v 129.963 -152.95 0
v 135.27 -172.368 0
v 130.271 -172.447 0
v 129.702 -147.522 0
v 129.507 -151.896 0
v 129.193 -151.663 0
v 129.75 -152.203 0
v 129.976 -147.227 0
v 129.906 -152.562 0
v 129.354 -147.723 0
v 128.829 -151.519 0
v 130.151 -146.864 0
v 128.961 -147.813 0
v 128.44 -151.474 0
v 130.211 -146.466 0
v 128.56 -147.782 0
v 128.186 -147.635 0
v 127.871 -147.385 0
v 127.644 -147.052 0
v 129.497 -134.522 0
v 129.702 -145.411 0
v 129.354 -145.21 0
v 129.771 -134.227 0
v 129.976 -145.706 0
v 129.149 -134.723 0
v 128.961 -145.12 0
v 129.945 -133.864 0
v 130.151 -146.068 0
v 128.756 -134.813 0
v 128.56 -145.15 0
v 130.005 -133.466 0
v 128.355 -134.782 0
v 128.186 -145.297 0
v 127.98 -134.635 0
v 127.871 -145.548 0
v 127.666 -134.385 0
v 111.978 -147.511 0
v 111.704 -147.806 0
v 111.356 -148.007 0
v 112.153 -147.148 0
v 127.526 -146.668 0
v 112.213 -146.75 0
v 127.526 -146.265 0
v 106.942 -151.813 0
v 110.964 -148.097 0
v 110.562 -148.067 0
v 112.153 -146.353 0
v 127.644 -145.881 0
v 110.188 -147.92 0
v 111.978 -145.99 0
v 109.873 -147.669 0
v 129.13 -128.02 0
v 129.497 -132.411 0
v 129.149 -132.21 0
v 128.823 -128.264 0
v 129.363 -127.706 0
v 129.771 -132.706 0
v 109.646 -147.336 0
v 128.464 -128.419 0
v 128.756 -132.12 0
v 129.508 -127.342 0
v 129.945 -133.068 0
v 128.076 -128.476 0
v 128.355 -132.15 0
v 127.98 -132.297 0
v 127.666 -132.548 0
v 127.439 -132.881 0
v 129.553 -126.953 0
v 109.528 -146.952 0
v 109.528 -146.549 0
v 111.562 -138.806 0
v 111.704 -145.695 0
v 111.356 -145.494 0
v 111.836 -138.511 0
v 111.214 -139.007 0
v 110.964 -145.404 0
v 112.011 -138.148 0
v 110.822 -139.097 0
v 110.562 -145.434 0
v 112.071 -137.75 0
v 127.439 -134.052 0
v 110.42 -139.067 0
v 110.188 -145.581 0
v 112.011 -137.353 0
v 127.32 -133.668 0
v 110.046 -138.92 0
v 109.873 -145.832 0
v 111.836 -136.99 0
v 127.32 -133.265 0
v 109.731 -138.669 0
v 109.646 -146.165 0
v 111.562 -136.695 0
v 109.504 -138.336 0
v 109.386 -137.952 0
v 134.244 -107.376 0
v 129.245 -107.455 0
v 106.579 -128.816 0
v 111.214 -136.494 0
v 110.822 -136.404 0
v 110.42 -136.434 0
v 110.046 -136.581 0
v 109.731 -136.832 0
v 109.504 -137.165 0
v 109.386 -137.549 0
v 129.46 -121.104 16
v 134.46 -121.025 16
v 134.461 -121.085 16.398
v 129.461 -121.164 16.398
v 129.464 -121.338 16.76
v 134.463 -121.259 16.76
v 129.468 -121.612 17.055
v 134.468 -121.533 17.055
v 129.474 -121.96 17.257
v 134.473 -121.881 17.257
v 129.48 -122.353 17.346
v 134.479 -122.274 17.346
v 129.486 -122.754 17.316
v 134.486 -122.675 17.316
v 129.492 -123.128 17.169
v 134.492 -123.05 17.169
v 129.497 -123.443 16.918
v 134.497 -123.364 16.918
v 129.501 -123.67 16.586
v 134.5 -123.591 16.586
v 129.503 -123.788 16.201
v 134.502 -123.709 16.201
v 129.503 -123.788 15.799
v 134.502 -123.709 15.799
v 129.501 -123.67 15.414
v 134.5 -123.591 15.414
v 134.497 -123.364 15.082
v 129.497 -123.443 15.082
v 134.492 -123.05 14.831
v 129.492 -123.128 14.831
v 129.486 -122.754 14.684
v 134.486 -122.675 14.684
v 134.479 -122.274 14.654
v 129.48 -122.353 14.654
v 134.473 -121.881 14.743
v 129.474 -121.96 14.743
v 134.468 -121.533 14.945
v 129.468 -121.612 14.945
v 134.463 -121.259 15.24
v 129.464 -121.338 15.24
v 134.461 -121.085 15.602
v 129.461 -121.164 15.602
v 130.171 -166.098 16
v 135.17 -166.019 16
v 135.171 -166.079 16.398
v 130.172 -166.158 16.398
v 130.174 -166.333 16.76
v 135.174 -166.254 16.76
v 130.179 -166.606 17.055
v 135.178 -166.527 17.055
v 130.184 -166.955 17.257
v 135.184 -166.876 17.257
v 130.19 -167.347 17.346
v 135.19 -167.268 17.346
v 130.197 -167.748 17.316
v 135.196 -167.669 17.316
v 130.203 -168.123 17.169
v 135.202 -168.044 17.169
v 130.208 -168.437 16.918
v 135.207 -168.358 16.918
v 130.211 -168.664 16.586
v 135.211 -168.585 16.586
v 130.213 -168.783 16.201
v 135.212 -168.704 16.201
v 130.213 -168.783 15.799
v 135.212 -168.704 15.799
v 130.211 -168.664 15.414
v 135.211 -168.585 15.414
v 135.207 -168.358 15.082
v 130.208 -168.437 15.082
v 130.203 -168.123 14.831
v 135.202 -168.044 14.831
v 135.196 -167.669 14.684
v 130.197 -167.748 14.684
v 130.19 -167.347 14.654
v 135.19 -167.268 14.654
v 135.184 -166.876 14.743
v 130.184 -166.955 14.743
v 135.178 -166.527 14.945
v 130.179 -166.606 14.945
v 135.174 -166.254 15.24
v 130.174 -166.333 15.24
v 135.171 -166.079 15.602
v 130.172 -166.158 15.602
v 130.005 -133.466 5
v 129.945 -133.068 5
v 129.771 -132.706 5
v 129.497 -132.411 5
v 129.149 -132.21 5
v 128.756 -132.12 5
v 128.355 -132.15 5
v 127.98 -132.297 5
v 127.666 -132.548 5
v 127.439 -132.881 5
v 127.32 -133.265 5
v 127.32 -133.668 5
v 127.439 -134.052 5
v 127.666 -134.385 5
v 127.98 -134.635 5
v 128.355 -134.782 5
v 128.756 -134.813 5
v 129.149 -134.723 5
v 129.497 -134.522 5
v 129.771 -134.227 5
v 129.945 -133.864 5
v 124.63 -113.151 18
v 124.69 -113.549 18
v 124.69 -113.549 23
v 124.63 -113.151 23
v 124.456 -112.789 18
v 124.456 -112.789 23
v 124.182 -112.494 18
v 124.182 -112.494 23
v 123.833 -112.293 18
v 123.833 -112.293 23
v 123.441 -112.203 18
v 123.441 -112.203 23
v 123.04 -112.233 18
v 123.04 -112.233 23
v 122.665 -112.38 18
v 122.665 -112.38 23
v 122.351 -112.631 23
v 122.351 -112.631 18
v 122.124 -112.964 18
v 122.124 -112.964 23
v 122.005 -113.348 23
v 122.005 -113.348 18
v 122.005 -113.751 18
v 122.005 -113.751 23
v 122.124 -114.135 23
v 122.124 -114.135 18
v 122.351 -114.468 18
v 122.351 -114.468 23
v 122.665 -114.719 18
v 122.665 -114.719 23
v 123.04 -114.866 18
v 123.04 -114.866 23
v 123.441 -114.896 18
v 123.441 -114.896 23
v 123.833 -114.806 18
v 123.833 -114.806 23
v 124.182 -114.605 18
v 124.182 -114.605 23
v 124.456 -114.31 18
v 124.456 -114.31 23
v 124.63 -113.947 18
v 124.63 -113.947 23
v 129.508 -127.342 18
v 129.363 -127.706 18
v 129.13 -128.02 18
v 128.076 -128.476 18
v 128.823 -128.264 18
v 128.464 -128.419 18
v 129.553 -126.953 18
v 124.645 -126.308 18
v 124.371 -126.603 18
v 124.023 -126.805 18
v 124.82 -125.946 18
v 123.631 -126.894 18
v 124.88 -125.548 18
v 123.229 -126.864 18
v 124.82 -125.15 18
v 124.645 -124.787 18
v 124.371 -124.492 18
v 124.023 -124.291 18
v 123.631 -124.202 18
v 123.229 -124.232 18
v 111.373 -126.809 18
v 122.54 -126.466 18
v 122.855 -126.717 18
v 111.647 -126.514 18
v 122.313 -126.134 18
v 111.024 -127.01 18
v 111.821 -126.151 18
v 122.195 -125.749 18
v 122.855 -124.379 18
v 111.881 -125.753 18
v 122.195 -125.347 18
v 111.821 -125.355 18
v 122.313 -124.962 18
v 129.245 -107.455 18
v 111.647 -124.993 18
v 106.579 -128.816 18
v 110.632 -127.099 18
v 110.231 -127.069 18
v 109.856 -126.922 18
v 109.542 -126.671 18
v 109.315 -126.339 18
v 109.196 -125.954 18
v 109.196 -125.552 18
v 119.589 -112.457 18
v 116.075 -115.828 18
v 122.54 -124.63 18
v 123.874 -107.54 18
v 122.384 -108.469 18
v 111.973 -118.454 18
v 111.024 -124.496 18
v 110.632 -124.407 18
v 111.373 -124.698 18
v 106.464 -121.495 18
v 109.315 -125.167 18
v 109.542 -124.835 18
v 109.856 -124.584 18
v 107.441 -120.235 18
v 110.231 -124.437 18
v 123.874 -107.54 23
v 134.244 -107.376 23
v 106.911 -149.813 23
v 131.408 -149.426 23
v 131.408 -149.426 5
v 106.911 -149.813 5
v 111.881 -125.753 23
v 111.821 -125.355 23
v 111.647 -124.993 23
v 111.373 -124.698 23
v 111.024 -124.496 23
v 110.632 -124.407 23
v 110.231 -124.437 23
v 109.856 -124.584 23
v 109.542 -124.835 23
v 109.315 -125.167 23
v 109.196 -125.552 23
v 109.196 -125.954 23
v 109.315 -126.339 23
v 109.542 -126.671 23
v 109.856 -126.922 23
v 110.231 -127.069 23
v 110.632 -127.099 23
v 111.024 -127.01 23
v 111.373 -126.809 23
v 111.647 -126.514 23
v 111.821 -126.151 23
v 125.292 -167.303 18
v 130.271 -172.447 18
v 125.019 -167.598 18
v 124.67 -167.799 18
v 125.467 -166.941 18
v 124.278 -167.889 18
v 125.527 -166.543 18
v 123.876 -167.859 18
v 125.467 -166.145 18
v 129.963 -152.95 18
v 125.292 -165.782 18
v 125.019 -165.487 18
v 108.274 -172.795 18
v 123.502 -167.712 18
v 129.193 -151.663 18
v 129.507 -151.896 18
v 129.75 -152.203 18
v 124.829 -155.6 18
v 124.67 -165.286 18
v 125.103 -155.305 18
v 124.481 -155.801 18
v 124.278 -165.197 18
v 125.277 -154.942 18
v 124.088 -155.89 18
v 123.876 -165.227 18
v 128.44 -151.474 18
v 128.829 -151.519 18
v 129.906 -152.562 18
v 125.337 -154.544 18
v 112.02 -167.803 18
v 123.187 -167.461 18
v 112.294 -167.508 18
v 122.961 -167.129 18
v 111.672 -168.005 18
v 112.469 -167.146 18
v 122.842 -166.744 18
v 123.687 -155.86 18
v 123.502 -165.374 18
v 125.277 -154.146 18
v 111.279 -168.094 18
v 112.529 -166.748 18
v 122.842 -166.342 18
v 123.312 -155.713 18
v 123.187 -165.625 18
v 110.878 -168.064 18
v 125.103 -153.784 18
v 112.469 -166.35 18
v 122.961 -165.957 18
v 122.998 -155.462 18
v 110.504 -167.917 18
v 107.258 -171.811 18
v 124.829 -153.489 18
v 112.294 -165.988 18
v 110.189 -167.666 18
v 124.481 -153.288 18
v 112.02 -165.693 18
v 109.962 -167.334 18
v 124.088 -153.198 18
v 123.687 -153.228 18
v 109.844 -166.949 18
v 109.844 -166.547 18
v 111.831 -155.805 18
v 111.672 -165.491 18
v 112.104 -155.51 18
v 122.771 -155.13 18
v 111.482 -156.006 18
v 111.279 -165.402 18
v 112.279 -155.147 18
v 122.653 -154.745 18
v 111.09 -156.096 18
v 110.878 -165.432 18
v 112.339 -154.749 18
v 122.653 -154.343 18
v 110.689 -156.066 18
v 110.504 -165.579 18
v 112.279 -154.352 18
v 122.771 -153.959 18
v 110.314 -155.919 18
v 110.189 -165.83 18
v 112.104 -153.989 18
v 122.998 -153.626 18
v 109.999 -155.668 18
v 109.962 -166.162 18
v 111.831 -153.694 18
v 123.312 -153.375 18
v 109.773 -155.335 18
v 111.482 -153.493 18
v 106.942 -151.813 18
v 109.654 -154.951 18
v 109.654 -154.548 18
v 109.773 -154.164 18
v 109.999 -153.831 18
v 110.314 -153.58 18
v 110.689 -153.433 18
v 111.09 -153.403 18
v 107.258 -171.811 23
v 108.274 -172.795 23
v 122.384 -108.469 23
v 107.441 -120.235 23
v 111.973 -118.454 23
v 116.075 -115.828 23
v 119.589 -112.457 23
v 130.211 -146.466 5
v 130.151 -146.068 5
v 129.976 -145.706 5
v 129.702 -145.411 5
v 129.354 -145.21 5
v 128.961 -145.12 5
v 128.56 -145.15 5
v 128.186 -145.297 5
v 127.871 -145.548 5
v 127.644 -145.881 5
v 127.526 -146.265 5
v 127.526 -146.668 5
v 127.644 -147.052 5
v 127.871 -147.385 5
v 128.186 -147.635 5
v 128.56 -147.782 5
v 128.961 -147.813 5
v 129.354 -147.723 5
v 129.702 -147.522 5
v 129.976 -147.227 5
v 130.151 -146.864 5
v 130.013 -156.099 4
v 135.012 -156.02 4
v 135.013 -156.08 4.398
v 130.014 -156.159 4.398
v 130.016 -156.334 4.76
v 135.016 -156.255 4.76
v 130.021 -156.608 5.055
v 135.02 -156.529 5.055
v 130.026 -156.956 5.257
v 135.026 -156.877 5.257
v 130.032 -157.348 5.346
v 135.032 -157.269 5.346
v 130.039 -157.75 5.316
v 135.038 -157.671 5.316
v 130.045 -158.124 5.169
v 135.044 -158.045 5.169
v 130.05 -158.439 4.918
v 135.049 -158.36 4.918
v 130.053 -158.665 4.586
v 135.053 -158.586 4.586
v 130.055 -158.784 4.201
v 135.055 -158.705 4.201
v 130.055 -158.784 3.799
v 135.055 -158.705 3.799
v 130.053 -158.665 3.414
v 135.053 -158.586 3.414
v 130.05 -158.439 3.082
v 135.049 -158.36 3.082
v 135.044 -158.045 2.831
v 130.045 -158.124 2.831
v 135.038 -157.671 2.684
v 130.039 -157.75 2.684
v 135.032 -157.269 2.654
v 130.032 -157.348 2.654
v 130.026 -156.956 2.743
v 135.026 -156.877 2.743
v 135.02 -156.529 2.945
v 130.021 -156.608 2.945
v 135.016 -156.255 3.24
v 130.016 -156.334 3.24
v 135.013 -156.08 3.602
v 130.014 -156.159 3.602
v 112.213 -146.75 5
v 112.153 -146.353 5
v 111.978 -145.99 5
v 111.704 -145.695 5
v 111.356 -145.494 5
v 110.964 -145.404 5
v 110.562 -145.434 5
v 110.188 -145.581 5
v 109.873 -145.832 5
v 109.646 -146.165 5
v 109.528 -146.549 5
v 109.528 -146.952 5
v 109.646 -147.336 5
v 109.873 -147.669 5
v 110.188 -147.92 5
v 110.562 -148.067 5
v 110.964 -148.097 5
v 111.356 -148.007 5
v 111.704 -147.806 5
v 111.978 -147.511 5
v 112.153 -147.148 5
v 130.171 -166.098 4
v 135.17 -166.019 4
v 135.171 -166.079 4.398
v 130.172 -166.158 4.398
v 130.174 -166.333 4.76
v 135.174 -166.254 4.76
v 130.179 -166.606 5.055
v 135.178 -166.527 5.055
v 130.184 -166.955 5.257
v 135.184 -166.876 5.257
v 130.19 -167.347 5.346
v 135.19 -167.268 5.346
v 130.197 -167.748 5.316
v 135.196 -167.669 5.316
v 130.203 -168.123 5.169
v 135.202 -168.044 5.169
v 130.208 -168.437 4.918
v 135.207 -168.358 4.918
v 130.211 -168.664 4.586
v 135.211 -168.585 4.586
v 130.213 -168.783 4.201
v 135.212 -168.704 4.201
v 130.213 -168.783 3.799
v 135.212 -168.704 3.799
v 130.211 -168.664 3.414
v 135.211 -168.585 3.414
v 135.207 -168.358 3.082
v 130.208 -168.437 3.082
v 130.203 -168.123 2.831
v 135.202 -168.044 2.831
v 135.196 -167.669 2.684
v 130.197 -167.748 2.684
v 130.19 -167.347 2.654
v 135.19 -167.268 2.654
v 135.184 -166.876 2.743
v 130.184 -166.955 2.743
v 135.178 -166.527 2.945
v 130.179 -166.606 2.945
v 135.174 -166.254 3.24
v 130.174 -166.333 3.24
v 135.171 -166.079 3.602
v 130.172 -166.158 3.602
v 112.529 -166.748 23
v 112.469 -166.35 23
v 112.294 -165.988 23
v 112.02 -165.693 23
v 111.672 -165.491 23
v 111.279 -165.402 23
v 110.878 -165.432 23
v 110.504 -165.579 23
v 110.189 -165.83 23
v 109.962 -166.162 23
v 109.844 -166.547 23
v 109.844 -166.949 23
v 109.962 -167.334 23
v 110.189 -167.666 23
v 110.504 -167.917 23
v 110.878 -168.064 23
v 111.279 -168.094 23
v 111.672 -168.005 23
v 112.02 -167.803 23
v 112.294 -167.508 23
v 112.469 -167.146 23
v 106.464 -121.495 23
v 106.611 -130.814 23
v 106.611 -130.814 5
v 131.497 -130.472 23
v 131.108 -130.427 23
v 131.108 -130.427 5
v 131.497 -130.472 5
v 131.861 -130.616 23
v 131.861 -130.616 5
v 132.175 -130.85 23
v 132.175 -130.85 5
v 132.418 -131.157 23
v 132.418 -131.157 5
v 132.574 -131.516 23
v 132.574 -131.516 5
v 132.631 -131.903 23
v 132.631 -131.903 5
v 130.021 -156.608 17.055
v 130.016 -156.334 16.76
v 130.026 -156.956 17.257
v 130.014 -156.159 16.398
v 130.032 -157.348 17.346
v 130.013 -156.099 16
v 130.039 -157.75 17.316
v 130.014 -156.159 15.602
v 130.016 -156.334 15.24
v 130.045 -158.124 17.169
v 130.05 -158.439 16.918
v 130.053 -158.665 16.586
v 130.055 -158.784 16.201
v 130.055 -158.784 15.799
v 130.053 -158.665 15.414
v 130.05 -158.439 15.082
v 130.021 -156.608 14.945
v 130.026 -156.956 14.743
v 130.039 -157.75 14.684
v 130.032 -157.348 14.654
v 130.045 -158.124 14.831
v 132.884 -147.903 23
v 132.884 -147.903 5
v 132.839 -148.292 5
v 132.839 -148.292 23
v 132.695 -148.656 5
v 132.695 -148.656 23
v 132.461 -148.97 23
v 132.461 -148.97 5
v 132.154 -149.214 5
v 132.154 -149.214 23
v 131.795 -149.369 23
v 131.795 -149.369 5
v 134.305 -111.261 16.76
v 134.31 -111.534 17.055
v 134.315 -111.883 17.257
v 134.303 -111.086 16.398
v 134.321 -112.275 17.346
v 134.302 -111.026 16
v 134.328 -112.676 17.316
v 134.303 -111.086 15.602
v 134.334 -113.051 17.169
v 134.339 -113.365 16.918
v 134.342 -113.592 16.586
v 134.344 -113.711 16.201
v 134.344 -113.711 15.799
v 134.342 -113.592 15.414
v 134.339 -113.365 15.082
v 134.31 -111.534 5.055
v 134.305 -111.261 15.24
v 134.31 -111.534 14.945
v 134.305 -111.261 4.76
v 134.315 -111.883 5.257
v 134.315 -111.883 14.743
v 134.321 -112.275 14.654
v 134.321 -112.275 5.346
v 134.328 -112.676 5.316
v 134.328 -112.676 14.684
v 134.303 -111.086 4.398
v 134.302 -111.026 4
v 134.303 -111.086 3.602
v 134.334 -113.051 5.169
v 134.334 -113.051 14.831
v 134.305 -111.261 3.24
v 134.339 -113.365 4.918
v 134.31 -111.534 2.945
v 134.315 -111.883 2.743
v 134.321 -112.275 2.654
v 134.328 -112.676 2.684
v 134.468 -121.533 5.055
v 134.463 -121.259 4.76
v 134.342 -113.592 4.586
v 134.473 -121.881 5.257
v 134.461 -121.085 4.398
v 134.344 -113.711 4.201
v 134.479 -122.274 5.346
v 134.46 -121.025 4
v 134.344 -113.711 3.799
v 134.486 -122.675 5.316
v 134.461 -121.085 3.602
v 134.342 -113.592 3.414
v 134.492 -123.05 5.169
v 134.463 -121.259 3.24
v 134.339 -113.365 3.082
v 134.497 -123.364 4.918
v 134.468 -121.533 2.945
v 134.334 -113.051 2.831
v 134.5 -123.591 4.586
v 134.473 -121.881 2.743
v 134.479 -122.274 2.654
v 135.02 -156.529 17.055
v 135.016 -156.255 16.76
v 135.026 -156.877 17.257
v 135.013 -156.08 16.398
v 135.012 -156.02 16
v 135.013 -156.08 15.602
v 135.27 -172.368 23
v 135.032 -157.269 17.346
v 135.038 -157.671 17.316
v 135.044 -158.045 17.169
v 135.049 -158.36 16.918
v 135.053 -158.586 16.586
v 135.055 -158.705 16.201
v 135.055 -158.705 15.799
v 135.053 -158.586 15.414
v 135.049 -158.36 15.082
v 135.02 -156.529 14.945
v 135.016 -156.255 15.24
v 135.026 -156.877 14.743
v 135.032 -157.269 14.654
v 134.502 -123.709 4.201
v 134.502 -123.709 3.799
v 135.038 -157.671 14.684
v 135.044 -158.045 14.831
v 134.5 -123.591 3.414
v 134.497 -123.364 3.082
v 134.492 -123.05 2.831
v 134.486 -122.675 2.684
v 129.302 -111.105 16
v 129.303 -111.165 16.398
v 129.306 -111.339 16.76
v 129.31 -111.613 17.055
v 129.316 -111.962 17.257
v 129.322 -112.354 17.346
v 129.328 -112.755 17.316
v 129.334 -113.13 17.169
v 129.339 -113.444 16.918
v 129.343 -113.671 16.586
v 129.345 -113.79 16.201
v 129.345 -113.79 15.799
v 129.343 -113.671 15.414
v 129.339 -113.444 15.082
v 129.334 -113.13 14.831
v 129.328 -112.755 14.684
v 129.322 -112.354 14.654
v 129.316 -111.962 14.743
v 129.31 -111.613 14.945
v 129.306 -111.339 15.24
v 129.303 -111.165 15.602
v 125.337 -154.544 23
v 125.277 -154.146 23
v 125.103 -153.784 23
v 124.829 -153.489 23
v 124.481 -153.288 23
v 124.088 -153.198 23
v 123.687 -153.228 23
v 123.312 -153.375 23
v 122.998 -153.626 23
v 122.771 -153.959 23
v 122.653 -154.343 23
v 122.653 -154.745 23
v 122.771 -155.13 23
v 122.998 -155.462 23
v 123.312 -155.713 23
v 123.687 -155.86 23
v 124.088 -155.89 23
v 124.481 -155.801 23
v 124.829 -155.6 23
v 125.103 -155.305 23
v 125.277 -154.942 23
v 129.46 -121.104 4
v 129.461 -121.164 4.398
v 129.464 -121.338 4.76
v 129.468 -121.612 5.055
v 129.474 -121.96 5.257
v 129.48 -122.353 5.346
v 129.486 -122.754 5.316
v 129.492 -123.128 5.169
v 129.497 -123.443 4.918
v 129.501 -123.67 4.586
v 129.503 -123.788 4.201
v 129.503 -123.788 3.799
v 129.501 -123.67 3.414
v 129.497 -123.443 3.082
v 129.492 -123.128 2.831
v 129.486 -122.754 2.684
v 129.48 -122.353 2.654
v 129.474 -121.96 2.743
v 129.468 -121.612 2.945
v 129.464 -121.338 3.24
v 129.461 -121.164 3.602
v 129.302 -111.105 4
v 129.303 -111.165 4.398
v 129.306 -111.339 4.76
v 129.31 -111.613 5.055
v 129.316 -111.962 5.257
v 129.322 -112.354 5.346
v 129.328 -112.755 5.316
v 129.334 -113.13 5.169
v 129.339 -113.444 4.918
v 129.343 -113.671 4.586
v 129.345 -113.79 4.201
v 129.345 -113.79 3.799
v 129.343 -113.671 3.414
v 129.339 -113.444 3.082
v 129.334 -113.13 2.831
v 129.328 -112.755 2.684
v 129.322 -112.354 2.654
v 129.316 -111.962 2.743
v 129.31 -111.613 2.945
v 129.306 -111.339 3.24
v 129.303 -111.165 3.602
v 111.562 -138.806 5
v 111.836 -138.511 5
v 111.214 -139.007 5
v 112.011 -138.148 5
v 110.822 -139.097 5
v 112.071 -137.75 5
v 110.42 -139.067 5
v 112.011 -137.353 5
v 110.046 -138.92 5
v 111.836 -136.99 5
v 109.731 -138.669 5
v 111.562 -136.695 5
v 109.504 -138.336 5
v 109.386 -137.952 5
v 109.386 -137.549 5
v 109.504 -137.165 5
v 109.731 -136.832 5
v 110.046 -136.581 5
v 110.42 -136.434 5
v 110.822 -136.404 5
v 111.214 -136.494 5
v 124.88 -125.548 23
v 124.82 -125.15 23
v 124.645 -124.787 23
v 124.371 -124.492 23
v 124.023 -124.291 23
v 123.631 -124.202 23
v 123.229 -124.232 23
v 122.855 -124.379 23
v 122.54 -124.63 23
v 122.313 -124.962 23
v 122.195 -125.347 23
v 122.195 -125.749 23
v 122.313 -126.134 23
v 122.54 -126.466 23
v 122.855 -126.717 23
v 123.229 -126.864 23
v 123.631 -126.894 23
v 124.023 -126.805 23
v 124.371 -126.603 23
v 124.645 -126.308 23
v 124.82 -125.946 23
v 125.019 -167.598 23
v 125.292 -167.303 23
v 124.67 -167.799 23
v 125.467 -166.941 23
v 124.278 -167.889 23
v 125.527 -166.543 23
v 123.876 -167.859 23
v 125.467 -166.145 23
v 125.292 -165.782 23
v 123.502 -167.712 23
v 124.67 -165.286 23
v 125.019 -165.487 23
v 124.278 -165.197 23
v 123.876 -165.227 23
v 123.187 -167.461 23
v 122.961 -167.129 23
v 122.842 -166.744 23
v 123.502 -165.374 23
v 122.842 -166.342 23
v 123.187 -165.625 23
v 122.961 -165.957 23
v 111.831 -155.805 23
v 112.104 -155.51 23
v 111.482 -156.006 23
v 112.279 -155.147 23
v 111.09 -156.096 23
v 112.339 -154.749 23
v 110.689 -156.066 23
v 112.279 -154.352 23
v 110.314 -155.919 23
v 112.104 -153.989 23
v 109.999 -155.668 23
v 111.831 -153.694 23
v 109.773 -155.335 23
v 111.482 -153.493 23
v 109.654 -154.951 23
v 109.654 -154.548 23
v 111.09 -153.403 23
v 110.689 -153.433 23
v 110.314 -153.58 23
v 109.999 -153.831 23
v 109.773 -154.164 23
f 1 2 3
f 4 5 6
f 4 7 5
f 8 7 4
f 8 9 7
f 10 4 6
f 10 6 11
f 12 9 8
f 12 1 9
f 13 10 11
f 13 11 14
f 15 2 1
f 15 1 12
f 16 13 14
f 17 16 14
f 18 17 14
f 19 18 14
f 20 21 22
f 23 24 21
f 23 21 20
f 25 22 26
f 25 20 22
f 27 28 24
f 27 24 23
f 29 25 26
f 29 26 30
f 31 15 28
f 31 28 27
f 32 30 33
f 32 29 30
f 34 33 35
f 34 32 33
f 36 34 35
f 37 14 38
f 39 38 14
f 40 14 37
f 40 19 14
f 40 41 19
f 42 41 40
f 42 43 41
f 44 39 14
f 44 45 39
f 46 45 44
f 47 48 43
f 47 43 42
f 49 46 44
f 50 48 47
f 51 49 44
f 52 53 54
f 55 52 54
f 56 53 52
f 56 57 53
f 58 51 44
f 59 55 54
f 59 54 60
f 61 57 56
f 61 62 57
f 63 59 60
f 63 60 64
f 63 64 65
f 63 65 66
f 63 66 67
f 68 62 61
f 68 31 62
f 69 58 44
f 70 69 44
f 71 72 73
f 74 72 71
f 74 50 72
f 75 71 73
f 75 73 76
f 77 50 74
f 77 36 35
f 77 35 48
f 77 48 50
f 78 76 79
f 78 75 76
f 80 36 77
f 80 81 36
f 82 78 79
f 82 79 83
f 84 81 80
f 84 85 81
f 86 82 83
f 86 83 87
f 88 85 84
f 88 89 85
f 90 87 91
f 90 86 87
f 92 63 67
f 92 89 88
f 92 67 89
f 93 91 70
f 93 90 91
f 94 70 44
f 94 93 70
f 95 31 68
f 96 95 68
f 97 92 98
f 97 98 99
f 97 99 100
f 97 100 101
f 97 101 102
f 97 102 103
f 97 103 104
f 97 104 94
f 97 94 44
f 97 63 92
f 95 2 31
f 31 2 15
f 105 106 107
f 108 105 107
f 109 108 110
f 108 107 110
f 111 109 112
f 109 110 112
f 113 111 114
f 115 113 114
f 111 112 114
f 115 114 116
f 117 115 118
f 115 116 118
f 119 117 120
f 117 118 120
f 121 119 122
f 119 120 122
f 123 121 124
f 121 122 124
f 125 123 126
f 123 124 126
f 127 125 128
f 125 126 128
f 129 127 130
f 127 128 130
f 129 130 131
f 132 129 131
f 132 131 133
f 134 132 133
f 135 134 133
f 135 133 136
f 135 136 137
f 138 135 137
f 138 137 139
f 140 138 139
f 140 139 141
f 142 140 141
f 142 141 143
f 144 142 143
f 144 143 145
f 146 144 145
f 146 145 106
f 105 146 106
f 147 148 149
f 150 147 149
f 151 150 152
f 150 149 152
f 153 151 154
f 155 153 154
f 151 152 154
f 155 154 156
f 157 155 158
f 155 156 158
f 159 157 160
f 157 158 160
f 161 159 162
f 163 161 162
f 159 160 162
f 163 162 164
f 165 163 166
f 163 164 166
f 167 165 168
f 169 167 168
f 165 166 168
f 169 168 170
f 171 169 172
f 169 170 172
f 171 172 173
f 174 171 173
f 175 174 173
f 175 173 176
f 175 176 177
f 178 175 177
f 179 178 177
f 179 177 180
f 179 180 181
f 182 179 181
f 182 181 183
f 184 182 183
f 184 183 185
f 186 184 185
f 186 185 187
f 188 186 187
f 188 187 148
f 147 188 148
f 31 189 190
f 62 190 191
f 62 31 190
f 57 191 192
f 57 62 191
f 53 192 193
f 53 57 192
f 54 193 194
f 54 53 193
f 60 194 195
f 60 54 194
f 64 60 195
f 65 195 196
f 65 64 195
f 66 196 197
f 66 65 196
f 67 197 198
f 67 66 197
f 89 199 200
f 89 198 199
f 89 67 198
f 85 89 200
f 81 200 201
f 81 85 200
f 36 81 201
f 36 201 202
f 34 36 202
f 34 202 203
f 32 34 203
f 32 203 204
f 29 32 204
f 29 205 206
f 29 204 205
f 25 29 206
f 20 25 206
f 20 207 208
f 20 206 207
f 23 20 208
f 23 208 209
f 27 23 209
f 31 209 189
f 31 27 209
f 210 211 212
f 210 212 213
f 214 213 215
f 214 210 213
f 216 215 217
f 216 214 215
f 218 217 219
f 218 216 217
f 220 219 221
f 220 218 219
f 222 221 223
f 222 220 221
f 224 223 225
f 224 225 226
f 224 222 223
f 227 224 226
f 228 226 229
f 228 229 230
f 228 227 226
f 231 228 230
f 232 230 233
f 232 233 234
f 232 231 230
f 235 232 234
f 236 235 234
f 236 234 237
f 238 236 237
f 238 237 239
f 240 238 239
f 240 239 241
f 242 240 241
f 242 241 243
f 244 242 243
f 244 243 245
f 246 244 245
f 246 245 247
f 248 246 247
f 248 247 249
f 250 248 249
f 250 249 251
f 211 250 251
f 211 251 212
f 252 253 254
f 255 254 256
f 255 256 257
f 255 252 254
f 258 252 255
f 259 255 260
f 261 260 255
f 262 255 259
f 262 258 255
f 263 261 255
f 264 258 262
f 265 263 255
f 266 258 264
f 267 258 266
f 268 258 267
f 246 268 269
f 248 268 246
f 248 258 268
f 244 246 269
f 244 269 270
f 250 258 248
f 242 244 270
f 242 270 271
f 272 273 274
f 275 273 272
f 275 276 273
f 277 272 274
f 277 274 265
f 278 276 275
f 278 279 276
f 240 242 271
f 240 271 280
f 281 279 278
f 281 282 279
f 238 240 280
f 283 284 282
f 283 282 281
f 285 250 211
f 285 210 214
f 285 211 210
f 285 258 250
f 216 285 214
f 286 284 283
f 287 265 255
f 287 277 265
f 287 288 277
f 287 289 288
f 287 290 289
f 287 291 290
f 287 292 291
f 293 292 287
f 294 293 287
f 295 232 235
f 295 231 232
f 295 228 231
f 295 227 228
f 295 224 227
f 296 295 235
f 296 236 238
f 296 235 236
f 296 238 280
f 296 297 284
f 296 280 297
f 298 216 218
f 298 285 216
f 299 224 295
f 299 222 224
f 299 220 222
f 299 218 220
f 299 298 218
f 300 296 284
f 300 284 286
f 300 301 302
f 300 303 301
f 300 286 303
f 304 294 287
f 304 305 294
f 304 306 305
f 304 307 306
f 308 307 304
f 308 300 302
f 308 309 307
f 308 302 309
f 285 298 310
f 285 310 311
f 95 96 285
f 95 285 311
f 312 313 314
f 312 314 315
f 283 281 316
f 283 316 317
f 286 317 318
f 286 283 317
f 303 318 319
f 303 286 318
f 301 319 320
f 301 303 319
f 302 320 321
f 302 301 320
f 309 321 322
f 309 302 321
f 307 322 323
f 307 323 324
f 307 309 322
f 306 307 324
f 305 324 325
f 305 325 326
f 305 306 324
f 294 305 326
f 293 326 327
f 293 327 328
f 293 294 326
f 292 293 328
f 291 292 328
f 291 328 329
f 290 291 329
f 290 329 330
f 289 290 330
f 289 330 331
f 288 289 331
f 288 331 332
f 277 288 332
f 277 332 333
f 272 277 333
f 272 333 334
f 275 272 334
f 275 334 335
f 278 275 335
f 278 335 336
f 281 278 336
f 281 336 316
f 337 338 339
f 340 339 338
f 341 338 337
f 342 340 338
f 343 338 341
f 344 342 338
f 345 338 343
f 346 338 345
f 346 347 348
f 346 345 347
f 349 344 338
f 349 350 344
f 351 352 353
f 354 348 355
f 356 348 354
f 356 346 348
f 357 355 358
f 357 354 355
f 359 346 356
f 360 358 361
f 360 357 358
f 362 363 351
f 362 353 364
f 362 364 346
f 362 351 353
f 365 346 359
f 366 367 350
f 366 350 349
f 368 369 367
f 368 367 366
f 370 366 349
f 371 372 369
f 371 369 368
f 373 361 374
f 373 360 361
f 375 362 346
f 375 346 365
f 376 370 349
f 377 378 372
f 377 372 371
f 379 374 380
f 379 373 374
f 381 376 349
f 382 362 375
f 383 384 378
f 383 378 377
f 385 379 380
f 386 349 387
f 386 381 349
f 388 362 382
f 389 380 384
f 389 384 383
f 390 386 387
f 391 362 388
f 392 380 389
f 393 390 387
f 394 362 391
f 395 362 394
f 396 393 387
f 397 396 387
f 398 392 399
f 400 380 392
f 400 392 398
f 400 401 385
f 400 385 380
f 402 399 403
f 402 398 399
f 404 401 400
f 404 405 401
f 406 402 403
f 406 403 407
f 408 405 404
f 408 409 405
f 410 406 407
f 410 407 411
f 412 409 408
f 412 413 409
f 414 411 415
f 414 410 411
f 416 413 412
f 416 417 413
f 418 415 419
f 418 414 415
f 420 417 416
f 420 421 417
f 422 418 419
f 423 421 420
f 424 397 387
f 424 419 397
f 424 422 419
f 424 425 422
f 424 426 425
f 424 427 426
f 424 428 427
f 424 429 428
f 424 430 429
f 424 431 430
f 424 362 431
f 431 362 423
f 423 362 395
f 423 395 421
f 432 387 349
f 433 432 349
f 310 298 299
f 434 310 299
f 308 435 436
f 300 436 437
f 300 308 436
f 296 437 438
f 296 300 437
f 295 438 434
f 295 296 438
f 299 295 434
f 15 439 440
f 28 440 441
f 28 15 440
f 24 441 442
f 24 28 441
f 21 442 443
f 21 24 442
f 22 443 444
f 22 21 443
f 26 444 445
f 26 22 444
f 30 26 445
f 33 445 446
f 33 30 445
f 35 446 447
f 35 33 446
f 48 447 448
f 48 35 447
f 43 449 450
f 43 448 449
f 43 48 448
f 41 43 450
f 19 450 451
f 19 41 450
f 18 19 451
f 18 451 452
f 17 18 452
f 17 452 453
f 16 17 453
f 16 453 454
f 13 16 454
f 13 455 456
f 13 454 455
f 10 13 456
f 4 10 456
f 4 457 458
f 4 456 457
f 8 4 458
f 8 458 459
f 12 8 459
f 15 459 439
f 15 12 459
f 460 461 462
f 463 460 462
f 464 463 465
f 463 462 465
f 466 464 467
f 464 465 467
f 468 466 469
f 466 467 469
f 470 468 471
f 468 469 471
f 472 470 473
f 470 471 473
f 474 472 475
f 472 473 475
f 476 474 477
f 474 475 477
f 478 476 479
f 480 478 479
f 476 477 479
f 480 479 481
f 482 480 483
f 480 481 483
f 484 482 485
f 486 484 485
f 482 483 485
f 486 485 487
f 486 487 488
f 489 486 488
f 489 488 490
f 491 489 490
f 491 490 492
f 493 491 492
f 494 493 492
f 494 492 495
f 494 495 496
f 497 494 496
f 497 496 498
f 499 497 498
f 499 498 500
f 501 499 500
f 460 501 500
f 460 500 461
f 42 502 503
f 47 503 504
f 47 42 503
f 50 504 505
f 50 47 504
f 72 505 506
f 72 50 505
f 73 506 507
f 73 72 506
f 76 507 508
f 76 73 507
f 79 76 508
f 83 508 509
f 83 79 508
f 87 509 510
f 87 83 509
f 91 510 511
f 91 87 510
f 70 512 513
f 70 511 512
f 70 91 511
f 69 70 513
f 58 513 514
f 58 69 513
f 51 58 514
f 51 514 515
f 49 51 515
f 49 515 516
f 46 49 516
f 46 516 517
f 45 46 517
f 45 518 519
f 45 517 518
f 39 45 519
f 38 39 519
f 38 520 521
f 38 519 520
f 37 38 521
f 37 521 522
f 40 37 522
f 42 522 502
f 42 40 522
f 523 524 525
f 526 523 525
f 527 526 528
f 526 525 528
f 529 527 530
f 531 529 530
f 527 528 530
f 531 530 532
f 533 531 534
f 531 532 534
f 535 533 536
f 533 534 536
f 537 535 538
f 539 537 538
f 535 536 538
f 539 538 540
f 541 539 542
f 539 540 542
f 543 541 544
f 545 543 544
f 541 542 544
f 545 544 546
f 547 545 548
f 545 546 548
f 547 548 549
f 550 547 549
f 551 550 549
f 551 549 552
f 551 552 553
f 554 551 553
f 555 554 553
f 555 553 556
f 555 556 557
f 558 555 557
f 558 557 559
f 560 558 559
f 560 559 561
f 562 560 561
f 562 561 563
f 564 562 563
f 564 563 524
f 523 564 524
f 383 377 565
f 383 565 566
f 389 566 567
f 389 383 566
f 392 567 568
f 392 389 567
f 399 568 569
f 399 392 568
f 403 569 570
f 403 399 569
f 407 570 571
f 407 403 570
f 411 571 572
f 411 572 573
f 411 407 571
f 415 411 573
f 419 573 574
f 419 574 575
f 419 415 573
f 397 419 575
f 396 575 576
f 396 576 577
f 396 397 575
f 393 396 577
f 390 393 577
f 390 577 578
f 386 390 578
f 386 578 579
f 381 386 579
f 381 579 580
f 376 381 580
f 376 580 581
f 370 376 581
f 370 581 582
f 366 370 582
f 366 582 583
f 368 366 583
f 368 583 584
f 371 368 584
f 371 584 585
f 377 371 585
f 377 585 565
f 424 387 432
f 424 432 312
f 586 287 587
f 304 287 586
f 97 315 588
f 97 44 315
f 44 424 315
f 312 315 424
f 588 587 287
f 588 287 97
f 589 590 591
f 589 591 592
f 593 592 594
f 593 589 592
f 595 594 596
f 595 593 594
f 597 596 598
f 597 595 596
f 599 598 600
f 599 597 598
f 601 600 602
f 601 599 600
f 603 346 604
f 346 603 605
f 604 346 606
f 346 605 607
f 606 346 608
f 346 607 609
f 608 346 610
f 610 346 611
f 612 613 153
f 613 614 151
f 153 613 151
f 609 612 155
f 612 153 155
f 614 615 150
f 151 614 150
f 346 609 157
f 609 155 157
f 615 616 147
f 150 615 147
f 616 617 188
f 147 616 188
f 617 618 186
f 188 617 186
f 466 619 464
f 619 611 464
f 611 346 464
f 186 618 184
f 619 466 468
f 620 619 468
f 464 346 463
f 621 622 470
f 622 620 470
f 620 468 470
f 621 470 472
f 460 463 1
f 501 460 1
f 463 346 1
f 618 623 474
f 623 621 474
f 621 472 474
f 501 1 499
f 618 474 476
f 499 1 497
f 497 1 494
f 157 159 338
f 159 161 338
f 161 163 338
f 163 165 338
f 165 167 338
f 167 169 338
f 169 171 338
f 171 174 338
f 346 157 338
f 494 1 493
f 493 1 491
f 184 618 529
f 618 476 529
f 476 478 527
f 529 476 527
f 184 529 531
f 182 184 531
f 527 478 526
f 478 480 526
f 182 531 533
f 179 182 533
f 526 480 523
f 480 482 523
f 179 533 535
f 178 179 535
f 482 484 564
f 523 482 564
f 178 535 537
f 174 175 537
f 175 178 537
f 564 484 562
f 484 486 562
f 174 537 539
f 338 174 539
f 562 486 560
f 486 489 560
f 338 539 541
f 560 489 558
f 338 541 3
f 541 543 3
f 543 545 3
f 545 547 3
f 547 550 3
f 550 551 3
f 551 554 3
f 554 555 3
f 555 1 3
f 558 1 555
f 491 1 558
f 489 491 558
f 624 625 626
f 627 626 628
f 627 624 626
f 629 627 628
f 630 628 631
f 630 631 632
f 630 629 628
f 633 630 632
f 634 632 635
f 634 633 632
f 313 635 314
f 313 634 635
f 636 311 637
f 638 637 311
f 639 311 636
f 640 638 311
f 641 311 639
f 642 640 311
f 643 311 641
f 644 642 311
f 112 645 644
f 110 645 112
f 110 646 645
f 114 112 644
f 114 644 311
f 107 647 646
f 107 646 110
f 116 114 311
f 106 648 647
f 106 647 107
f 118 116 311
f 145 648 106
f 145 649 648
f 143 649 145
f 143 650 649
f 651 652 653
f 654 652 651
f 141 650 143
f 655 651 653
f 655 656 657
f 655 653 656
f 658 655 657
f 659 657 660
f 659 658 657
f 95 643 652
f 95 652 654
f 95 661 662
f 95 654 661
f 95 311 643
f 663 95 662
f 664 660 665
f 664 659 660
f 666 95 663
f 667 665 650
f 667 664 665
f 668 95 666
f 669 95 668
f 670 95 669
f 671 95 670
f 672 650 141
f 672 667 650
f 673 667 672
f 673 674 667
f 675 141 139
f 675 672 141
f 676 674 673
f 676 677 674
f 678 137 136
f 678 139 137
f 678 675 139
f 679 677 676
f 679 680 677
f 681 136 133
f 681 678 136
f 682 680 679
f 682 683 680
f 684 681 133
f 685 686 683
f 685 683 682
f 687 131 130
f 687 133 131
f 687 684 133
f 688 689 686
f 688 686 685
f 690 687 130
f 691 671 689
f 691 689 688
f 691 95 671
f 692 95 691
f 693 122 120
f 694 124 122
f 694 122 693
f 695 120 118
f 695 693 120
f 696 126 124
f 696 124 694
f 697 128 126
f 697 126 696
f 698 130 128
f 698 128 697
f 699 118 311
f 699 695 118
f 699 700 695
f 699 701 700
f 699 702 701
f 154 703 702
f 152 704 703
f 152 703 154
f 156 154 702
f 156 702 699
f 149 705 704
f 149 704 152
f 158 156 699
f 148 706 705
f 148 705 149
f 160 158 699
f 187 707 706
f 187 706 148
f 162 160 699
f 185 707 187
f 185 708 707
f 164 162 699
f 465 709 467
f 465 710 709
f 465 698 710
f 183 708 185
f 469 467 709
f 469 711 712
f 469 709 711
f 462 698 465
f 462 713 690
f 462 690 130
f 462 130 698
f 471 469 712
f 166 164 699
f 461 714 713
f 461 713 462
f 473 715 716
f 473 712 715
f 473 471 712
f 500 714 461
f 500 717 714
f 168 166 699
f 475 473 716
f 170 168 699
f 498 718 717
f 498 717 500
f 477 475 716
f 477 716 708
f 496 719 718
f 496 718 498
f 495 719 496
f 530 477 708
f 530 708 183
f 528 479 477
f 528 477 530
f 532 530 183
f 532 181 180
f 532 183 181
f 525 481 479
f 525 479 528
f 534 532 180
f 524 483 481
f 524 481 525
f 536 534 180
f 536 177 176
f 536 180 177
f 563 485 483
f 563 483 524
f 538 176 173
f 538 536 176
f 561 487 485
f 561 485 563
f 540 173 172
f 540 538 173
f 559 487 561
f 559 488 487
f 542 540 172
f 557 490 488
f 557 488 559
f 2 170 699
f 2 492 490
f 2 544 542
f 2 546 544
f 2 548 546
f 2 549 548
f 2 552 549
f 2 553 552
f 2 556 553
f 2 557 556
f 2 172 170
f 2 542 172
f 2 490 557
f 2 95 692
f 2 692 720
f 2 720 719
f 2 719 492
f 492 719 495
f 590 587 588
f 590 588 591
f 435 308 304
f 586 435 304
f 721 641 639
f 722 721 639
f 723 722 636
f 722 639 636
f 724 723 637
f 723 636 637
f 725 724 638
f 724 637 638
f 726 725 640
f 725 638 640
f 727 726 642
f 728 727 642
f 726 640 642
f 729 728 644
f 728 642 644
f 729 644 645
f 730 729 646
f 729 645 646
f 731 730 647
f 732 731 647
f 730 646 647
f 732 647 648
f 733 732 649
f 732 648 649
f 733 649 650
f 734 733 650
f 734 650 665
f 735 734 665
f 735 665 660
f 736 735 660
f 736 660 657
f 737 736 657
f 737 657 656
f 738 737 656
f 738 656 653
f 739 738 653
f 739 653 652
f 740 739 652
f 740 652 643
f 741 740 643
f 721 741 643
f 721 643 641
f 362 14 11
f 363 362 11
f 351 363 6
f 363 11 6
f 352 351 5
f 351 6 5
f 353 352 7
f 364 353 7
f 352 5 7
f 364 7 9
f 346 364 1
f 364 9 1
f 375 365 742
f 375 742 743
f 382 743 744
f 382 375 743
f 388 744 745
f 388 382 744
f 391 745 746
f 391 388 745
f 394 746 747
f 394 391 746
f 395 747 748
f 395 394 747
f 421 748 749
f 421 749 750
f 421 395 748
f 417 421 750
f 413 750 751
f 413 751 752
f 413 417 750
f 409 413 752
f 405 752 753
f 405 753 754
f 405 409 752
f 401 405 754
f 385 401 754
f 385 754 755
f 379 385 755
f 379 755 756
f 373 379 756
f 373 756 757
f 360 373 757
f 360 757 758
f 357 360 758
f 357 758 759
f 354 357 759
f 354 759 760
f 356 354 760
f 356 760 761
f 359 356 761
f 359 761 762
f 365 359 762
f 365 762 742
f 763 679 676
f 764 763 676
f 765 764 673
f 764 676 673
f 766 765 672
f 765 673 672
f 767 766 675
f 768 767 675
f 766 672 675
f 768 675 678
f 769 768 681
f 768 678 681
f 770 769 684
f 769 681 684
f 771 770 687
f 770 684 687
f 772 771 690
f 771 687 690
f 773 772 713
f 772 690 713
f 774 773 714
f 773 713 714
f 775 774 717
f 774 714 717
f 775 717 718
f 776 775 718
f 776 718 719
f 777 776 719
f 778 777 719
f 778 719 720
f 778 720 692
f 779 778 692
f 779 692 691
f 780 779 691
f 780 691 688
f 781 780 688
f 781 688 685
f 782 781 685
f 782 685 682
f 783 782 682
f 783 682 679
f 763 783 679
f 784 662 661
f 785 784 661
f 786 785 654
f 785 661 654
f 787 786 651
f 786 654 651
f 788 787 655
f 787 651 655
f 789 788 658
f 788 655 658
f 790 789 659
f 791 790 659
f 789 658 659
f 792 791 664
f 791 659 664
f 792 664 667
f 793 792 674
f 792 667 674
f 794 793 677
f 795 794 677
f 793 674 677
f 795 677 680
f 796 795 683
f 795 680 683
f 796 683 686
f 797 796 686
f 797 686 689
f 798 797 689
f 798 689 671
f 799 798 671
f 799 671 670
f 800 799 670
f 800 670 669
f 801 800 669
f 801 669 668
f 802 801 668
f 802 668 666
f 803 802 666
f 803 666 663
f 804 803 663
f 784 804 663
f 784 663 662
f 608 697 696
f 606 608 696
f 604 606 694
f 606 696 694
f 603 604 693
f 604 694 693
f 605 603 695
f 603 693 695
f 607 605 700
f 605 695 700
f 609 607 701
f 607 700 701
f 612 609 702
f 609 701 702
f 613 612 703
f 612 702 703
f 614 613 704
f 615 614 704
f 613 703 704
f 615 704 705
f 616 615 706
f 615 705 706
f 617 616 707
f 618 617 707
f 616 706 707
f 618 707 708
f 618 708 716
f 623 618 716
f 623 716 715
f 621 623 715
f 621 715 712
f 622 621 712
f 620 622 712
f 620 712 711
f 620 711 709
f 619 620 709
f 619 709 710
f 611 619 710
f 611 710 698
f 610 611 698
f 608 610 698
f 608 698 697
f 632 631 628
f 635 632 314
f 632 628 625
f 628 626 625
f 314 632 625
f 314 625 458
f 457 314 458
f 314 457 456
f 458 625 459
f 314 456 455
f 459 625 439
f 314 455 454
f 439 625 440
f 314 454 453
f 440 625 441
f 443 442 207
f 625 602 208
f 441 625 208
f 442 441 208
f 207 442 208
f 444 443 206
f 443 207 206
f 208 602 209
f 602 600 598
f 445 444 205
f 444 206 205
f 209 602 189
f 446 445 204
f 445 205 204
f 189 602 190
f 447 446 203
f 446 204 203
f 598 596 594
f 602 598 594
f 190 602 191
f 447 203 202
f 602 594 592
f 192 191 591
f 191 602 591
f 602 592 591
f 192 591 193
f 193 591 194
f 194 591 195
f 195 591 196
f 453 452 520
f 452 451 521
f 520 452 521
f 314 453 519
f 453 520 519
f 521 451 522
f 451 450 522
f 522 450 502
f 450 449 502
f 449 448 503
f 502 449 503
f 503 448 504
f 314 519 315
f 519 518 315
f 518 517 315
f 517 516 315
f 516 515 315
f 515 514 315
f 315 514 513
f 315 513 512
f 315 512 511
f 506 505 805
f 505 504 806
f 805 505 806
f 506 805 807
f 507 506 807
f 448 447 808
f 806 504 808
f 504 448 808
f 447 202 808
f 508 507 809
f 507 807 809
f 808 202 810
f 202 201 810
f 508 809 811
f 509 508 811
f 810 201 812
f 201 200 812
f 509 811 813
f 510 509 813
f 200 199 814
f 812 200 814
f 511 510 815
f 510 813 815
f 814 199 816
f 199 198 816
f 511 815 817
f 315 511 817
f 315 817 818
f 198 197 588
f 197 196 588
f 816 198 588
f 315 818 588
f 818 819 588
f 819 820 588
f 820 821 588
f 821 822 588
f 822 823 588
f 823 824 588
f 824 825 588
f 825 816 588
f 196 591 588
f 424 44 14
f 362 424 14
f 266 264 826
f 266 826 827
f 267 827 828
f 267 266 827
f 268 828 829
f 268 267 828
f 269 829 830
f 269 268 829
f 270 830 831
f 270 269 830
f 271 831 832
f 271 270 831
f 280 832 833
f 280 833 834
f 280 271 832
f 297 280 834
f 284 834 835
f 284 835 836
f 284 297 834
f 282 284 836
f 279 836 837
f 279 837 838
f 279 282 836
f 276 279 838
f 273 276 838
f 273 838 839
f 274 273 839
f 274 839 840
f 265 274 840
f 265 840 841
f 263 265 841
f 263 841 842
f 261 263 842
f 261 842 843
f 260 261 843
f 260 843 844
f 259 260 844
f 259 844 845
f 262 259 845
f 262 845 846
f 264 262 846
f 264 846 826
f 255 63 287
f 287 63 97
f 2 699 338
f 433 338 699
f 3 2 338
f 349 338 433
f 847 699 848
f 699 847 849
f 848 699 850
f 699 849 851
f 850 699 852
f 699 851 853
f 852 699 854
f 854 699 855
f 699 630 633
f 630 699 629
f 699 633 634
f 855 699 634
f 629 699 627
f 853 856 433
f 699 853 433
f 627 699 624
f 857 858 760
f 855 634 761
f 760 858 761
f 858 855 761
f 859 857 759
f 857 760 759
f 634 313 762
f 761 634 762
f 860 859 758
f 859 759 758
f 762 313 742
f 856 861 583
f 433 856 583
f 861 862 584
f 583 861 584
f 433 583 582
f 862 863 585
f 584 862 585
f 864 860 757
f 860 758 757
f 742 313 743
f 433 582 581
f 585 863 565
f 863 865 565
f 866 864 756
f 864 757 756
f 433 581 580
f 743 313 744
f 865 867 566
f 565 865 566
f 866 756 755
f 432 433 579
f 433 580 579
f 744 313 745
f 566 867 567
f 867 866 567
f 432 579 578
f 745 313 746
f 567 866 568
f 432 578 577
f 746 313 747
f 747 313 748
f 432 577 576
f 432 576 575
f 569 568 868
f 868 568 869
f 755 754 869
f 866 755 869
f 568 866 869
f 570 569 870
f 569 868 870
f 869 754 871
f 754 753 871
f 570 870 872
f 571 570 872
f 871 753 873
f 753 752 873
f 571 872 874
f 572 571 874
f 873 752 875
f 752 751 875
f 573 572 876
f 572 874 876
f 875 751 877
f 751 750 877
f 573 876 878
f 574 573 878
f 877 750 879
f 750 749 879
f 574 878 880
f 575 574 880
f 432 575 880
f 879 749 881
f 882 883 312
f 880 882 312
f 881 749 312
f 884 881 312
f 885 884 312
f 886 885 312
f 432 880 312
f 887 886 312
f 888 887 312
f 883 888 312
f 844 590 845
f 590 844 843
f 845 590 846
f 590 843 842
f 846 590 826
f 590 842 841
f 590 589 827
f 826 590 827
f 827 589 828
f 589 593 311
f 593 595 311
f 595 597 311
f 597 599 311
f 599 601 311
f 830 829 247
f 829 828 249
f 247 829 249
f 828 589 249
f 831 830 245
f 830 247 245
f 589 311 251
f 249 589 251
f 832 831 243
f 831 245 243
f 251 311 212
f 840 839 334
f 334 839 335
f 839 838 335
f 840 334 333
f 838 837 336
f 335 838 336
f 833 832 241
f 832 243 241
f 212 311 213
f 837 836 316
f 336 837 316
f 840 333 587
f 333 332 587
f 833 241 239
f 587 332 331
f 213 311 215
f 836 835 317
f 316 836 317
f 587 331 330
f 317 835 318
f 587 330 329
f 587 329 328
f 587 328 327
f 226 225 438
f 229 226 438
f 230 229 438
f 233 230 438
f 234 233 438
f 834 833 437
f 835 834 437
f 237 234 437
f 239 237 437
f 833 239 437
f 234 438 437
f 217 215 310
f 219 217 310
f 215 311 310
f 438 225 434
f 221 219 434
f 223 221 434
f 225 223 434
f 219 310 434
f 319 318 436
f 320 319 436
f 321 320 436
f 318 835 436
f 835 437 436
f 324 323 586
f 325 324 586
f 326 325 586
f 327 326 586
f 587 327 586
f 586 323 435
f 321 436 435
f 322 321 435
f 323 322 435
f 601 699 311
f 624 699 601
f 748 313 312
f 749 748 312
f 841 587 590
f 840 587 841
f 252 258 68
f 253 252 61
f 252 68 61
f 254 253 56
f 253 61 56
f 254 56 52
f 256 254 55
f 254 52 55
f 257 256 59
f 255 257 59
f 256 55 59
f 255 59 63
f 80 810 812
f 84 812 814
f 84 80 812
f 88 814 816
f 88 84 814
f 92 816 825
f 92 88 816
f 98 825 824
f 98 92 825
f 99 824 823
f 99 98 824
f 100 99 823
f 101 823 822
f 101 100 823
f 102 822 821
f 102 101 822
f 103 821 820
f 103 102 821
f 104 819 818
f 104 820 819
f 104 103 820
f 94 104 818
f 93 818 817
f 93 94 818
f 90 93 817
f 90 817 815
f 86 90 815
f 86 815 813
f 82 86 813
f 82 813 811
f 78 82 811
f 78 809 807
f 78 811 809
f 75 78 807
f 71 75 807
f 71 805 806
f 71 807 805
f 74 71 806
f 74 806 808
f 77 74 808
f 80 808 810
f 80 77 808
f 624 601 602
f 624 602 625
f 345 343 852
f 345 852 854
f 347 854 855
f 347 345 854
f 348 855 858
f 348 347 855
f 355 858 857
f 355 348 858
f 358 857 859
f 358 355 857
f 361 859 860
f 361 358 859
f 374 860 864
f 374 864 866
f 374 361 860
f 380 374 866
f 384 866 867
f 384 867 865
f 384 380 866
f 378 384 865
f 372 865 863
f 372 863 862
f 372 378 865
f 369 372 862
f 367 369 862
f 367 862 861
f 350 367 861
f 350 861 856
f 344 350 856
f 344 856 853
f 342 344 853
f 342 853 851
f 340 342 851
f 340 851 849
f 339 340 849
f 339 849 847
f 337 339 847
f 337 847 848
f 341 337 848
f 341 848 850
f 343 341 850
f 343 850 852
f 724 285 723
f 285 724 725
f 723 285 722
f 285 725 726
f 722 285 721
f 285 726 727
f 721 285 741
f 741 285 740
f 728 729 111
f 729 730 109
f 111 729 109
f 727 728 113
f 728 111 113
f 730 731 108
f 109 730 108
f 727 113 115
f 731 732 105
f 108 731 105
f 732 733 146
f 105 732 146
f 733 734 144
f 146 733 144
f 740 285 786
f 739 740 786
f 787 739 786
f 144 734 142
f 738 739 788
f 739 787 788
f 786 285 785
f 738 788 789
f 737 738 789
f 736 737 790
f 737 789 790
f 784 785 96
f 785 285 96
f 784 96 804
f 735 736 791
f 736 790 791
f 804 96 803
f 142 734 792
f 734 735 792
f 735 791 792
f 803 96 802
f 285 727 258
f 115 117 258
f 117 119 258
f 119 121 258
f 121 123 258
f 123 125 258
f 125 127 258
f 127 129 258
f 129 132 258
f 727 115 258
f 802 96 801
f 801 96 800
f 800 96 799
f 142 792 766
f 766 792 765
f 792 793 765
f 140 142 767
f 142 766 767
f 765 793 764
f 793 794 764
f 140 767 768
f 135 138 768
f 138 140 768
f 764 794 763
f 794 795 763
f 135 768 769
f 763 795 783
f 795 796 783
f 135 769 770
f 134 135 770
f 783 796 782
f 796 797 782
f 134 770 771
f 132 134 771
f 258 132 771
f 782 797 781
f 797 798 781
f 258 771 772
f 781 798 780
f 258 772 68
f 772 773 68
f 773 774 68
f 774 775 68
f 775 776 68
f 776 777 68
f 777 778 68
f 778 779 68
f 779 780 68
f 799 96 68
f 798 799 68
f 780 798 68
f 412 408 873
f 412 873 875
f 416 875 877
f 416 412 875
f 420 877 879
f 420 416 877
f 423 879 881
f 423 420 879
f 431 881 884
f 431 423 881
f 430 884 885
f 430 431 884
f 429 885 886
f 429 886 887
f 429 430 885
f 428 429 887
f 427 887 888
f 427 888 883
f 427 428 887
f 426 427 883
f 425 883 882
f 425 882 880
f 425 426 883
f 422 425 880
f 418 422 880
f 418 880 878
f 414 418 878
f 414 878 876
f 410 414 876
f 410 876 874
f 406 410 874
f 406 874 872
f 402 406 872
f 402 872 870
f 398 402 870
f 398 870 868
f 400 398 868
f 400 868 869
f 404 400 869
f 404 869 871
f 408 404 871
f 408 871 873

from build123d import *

# Parameters (mm, degrees)
SKETCH1_R          = 1.35
EXTRUDE1_DEPTH     = 23
SKETCH2_R          = 1.35
CUT_EXTRUDE1_DEPTH = 10
CHAMFER3_SIZE      = 1
EXTRUDE2_DEPTH     = 18
EXTRUDE3_DEPTH     = 18


with BuildPart() as part:
    # Sketch1 → Extrude1 (new body)
    with BuildSketch(Plane.XY):
        with BuildLine():
            Line((134.244131426, -107.376468954), (135.270230766, -172.368369374))
            Line((135.270230766, -172.368369374), (107.273719816, -172.810381397))
            Line((107.273719816, -172.810381397), (106.44776294, -120.495264366))
            ThreePointArc((106.44776294, -120.495264366), (116.078507859, -115.825445612), (122.873690334, -107.555986741))
            Line((122.873690334, -107.555986741), (134.244131426, -107.376468954))
        make_face()
        with Locations((110.720688645, -137.750476655)):
            Circle(SKETCH1_R, mode=Mode.SUBTRACT)
        with Locations((111.178504518, -166.747984476)):
            Circle(SKETCH1_R, mode=Mode.SUBTRACT)
        with Locations((124.176884602, -166.542764608)):
            Circle(SKETCH1_R, mode=Mode.SUBTRACT)
        with Locations((123.987450878, -154.544259915)):
            Circle(SKETCH1_R, mode=Mode.SUBTRACT)
        with Locations((110.989070794, -154.749479783)):
            Circle(SKETCH1_R, mode=Mode.SUBTRACT)
        with Locations((123.529652711, -125.547873574)):
            Circle(SKETCH1_R, mode=Mode.SUBTRACT)
        with Locations((110.531272627, -125.753093442)):
            Circle(SKETCH1_R, mode=Mode.SUBTRACT)
        with Locations((123.340218986, -113.549368881)):
            Circle(SKETCH1_R, mode=Mode.SUBTRACT)
        with Locations((128.65529324, -133.466326068)):
            Circle(SKETCH1_R, mode=Mode.SUBTRACT)
        with Locations((110.862781644, -146.750476655)):
            Circle(SKETCH1_R, mode=Mode.SUBTRACT)
        with Locations((128.860538683, -146.466326068)):
            Circle(SKETCH1_R, mode=Mode.SUBTRACT)
    extrude(amount=EXTRUDE1_DEPTH)

    # Sketch2 → Cut-Extrude1 (cut)
    with BuildSketch(Plane(origin=(132.515828327, 2.092174611, 0), x_dir=(0, 0, -1), z_dir=(0.9998753910699589, 0.01578614369301875, 0))):
        with Locations(Location((-16, -114.482286036, 0), (0, 0, 90))):
            Circle(SKETCH2_R)
        with Locations(Location((-4, -114.482286036, 0), (0, 0, 90))):
            Circle(SKETCH2_R)
        with Locations(Location((-16, -124.482286036, 0), (0, 0, 90))):
            Circle(SKETCH2_R)
        with Locations(Location((-4, -124.482286036, 0), (0, 0, 90))):
            Circle(SKETCH2_R)
        with Locations(Location((-16, -169.482286036, 0), (0, 0, 90))):
            Circle(SKETCH2_R)
        with Locations(Location((-4, -169.482286036, 0), (0, 0, 90))):
            Circle(SKETCH2_R)
        with Locations(Location((-16, -159.482286036, 0), (0, 0, 90))):
            Circle(SKETCH2_R)
        with Locations(Location((-4, -159.482286036, 0), (0, 0, 90))):
            Circle(SKETCH2_R)
    extrude(amount=-CUT_EXTRUDE1_DEPTH, mode=Mode.SUBTRACT)

    # Chamfer3
    # the kernel refuses this chamfer: 1 mm, written as the material it takes off along each edge
    with BuildSketch(Plane(origin=(107.273719816, -172.810381397, -2.571682988), x_dir=(-0.01578614369302038, 0.9998753910699589, 0), z_dir=(0, 0, 1))) as chamfer3_piece_1:
        Polygon((CHAMFER3_SIZE, 0), (0, -CHAMFER3_SIZE), (0, 0), align=None)
    extrude(amount=28.143365976, mode=Mode.SUBTRACT)
    with BuildSketch(Plane(origin=(106.44776294, -120.495264366, -2.646322056), x_dir=(0.9673390331642948, 0.2534860842665082, 0), z_dir=(0, 0, 1))) as chamfer3_piece_2:
        with BuildLine():
            Line((1.026523691, 0), (-CHAMFER3_SIZE * 0.238183944659, -CHAMFER3_SIZE * 0.971220061833))
            Line((-CHAMFER3_SIZE * 0.238183944659, -CHAMFER3_SIZE * 0.971220061833), (0, 0))
            ThreePointArc((0, 0), (0.529135289, -0.00526427), (1.026523691, 0))
        make_face()
    extrude(amount=28.292644112, mode=Mode.SUBTRACT)
    with BuildSketch(Plane(origin=(122.873690334, -107.555986741, -2.676981296), x_dir=(0.9998753910699592, 0.015786143693006172, 0), z_dir=(0, 0, 1))) as chamfer3_piece_3:
        with BuildLine():
            Line((CHAMFER3_SIZE, 0), (-0.504457815, -0.904781971))
            ThreePointArc((-0.504457815, -0.904781971), (-0.256001011, -0.470163527), (0, 0))
            Line((0, 0), (CHAMFER3_SIZE, 0))
        make_face()
    extrude(amount=28.353962591, mode=Mode.SUBTRACT)

    # Sketch3 → Extrude2 (cut)
    with BuildSketch(Plane.XY.offset(23)):
        with BuildLine():
            Line((104.011515413, -130.855030895), (131.107623287, -130.427234536))
            ThreePointArc((131.107623287, -130.427234536), (132.175086772, -130.849775884), (132.631115589, -131.903368407))
            Line((132.631115589, -131.903368407), (132.883719463, -147.90299458))
            ThreePointArc((132.883719463, -147.90299458), (132.461178115, -148.970458066), (131.407585592, -149.426486882))
            Line((131.407585592, -149.426486882), (104.311477719, -149.854283242))
            ThreePointArc((104.311477719, -149.854283242), (103.244014233, -149.431741893), (102.787985417, -148.378149371))
            Line((102.787985417, -148.378149371), (102.535381542, -132.378523198))
            ThreePointArc((102.535381542, -132.378523198), (102.957922891, -131.311059712), (104.011515413, -130.855030895))
        make_face()
    extrude(amount=-EXTRUDE2_DEPTH, mode=Mode.SUBTRACT)

    # Sketch4 → Extrude3 (cut)
    with BuildSketch(Plane(origin=(0, 0, 0), x_dir=(-1, 0, 0), z_dir=(0, 0, -1))):
        with BuildLine():
            Line((-128.995288436, -91.654520496), (-129.552584273, -126.952969799))
            ThreePointArc((-129.552584273, -126.952969799), (-129.130042924, -128.020433284), (-128.076450401, -128.476462101))
            Line((-128.076450401, -128.476462101), (-95.502554389, -128.990742388))
            ThreePointArc((-95.502554389, -128.990742388), (-94.435090904, -128.568201039), (-93.979062087, -127.514608517))
            Line((-93.979062087, -127.514608517), (-93.42176625, -92.216159214))
            ThreePointArc((-93.42176625, -92.216159214), (-93.844307599, -91.148695728), (-94.897900122, -90.692666912))
            Line((-94.897900122, -90.692666912), (-127.471796134, -90.178386625))
            ThreePointArc((-127.471796134, -90.178386625), (-128.539259619, -90.600927973), (-128.995288436, -91.654520496))
        make_face()
        with BuildLine():
            Line((-129.963024009, -152.949729966), (-130.439103933, -183.104060885))
            ThreePointArc((-130.439103933, -183.104060885), (-130.016562585, -184.17152437), (-128.962970062, -184.627553187))
            Line((-128.962970062, -184.627553187), (-101.681956846, -185.058268853))
            ThreePointArc((-101.681956846, -185.058268853), (-100.61449336, -184.635727504), (-100.158464544, -183.582134982))
            Line((-100.158464544, -183.582134982), (-99.682384619, -153.427804063))
            ThreePointArc((-99.682384619, -153.427804063), (-100.104925968, -152.360340578), (-101.15851849, -151.904311761))
            Line((-101.15851849, -151.904311761), (-128.439531706, -151.473596095))
            ThreePointArc((-128.439531706, -151.473596095), (-129.506995192, -151.896137444), (-129.963024009, -152.949729966))
        make_face()
    extrude(amount=-EXTRUDE3_DEPTH, mode=Mode.SUBTRACT)


solid = part.part
